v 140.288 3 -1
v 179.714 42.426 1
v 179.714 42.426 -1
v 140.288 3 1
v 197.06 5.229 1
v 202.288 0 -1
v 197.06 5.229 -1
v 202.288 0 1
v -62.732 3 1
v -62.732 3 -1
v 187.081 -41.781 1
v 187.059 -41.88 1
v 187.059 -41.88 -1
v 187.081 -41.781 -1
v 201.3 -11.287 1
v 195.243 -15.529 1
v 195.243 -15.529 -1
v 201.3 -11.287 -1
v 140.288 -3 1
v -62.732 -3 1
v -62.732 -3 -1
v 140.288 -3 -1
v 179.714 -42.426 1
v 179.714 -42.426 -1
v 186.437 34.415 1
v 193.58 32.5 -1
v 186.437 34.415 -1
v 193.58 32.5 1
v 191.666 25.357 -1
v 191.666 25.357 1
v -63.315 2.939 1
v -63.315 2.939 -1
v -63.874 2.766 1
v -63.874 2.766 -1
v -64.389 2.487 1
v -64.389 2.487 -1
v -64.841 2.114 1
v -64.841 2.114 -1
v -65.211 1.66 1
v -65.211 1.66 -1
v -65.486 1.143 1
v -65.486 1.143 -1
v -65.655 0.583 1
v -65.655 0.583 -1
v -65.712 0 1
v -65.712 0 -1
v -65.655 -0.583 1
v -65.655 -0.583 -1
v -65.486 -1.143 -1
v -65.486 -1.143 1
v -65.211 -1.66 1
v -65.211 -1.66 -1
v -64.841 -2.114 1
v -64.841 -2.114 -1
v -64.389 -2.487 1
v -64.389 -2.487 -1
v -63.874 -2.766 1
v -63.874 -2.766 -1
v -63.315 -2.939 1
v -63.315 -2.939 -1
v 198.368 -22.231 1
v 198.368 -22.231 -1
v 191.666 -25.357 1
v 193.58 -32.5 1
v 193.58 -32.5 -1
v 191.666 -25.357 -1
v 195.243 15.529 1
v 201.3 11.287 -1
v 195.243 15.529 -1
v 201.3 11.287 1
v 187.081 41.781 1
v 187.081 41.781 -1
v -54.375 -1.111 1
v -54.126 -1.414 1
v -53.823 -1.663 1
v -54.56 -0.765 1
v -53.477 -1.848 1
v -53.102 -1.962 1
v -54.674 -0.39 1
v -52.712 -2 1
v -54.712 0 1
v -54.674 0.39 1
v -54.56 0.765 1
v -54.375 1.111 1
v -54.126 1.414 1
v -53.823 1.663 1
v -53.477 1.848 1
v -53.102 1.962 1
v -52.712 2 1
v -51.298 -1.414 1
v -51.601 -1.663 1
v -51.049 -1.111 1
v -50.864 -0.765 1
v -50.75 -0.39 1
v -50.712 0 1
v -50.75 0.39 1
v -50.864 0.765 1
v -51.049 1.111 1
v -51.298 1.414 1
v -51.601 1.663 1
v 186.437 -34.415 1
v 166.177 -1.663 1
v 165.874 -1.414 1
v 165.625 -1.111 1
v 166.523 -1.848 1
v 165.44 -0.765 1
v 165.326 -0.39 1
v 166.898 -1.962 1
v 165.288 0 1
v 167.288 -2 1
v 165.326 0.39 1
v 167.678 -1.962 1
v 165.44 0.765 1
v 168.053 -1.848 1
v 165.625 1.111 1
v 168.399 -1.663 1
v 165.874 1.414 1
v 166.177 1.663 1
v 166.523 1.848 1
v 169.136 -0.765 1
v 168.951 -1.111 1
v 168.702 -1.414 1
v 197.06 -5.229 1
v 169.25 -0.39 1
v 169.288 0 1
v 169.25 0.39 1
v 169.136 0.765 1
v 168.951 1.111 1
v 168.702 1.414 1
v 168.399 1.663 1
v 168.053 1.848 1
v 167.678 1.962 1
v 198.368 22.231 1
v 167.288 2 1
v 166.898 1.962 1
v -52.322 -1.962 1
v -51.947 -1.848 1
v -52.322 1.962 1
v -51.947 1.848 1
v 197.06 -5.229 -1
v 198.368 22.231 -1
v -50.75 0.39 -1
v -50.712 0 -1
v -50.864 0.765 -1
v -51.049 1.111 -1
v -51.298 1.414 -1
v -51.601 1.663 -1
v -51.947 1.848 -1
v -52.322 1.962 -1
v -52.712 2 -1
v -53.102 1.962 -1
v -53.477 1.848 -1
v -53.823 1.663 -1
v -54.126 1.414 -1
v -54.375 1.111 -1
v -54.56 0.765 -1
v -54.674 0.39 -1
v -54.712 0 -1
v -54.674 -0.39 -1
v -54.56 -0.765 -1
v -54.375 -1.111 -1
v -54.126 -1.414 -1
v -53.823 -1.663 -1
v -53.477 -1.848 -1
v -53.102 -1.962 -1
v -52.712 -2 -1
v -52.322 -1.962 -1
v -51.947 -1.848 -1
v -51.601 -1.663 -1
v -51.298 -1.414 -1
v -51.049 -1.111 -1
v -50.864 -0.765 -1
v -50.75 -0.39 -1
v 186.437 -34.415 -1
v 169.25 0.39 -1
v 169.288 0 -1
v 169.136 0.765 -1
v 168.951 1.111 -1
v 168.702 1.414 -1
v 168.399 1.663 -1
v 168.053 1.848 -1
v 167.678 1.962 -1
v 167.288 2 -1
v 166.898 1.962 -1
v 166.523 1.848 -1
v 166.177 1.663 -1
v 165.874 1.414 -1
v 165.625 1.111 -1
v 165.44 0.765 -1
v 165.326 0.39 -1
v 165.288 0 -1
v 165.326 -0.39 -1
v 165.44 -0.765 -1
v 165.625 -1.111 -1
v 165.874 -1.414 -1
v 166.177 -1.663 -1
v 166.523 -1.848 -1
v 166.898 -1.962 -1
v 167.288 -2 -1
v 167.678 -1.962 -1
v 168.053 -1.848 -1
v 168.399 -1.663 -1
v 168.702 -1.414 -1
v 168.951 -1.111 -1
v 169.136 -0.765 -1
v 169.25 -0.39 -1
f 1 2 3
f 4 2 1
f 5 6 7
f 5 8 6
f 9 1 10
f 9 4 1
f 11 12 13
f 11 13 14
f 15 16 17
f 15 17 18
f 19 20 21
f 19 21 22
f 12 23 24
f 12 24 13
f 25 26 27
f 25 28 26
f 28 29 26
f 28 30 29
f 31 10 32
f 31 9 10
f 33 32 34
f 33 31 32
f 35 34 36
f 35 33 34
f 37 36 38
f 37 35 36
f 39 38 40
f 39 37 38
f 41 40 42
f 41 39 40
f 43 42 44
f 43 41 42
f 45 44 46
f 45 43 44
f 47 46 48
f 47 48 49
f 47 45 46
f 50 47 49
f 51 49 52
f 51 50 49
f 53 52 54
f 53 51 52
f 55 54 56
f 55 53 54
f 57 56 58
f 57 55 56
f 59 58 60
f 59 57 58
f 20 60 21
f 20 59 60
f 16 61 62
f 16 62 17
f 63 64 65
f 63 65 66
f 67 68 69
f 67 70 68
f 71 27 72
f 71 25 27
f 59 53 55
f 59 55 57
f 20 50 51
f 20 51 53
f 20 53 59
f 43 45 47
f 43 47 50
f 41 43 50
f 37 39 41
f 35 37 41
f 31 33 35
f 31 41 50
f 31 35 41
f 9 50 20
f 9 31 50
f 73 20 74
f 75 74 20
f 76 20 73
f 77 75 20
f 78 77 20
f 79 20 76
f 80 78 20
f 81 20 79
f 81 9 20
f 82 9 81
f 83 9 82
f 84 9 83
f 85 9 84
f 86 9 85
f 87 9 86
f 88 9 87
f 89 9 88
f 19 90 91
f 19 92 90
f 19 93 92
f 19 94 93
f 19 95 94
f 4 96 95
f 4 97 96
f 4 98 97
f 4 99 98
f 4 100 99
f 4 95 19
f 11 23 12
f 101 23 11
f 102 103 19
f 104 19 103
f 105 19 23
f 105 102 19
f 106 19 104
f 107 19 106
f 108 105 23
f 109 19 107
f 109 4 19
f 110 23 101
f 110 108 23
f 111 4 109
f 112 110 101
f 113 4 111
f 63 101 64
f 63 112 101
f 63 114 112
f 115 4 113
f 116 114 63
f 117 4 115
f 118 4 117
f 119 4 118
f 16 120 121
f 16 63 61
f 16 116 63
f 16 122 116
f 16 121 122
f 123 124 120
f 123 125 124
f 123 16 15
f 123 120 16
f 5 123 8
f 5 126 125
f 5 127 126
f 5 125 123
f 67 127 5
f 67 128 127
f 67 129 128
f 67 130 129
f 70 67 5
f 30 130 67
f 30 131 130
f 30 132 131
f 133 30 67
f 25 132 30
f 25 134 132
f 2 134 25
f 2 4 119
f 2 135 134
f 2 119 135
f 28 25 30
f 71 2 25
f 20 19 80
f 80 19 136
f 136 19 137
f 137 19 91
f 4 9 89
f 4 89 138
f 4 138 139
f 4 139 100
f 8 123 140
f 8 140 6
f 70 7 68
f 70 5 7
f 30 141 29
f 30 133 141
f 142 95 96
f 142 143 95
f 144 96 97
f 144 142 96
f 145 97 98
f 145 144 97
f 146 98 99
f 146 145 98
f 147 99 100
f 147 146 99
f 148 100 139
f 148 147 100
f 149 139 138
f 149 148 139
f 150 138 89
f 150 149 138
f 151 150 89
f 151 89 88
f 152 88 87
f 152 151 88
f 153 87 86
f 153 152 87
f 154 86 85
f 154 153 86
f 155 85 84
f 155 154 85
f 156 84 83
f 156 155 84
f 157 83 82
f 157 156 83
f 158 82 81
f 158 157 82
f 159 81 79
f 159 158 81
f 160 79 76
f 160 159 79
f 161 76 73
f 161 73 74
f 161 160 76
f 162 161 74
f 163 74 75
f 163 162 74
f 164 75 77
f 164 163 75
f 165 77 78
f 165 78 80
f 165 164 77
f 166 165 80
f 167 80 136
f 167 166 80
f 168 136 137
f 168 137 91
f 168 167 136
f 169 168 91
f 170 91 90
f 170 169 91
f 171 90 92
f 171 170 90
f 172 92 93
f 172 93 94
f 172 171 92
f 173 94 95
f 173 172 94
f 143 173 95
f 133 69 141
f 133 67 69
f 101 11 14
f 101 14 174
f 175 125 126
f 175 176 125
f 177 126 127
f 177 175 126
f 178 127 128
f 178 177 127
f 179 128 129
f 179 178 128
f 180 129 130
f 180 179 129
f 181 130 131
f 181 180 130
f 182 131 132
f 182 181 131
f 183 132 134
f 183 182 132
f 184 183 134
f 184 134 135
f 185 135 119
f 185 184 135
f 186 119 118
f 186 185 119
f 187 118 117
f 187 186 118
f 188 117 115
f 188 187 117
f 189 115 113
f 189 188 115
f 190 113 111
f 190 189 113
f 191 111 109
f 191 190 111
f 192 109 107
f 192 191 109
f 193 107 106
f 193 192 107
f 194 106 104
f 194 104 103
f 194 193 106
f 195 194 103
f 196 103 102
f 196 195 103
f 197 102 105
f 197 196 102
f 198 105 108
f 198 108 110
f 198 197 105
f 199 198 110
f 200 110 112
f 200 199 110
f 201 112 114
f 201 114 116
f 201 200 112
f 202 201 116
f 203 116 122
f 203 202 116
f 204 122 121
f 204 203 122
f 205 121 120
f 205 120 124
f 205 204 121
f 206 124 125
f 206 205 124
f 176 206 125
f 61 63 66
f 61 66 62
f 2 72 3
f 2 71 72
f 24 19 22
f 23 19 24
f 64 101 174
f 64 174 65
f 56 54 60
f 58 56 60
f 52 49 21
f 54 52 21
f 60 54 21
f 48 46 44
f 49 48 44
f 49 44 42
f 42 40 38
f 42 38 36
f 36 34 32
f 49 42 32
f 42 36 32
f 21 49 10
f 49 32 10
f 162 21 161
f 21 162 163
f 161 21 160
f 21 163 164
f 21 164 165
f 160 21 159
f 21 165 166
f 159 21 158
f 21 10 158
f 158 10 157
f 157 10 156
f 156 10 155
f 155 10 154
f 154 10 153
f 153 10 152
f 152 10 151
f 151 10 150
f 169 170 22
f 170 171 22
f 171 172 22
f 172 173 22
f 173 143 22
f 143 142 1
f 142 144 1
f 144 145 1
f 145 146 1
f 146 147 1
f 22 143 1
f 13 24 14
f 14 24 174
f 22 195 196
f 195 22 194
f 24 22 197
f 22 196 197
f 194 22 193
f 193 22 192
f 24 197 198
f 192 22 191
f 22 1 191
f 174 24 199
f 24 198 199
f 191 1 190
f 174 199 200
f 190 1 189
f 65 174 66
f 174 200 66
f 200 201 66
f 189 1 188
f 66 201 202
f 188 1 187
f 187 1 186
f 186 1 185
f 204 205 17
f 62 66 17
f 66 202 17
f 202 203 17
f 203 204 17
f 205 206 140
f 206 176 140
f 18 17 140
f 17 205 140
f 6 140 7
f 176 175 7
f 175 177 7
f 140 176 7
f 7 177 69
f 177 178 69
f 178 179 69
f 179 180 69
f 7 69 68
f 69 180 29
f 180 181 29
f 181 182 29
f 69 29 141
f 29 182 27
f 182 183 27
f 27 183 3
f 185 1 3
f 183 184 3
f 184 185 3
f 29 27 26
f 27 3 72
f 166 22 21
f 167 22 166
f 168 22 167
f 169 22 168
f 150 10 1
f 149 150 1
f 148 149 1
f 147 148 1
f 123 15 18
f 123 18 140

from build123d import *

# Parameters (mm, degrees)
SKETCH_1_R      = 2
EXTRUDE_1_DEPTH = 1


with BuildPart() as part:
    # 草图1 → 凸台-拉伸1 (new, symmetric)
    with BuildSketch(Plane.XY):
        with BuildLine():
            ThreePointArc((-62.732371345, 3), (-65.712136607, 0), (-62.732371345, -3))
            Line((-62.732371345, -3), (-62.69176446, -3))
            Line((-62.69176446, -3), (140.287932097, -3))
            Line((140.287932097, -3), (179.714338968, -42.426406871))
            Line((179.714338968, -42.426406871), (187.058698637, -41.880427348))
            Line((187.058698637, -41.880427348), (187.0808209, -41.78119463))
            Line((187.0808209, -41.78119463), (186.437054755, -34.414586181))
            Line((186.437054755, -34.414586181), (193.579583343, -32.5))
            Line((193.579583343, -32.5), (191.666399319, -25.357095704))
            Line((191.666399319, -25.357095704), (198.367952448, -22.231309316))
            Line((198.367952448, -22.231309316), (195.243481675, -15.529142706))
            Line((195.243481675, -15.529142706), (201.300436043, -11.287131548))
            Line((201.300436043, -11.287131548), (197.059613983, -5.229344565))
            Line((197.059613983, -5.229344565), (202.287932097, 0))
            Line((202.287932097, 0), (197.059613983, 5.229344565))
            Line((197.059613983, 5.229344565), (201.300436043, 11.287131548))
            Line((201.300436043, 11.287131548), (195.243481675, 15.529142706))
            Line((195.243481675, 15.529142706), (198.367952448, 22.231309316))
            Line((198.367952448, 22.231309316), (191.666399319, 25.357095704))
            Line((191.666399319, 25.357095704), (193.579583343, 32.5))
            Line((193.579583343, 32.5), (186.437054755, 34.414586181))
            Line((186.437054755, 34.414586181), (187.0808209, 41.78119463))
            Line((187.0808209, 41.78119463), (179.714338968, 42.426406871))
            Line((179.714338968, 42.426406871), (140.287932097, 3))
            Line((140.287932097, 3), (-62.69176446, 3))
            Line((-62.69176446, 3), (-62.732371345, 3))
        make_face()
        with Locations((-52.712067903, 0)):
            Circle(SKETCH_1_R, mode=Mode.SUBTRACT)
        with Locations((167.287932097, 0)):
            Circle(SKETCH_1_R, mode=Mode.SUBTRACT)
    extrude(amount=EXTRUDE_1_DEPTH, both=True)


solid = part.part
